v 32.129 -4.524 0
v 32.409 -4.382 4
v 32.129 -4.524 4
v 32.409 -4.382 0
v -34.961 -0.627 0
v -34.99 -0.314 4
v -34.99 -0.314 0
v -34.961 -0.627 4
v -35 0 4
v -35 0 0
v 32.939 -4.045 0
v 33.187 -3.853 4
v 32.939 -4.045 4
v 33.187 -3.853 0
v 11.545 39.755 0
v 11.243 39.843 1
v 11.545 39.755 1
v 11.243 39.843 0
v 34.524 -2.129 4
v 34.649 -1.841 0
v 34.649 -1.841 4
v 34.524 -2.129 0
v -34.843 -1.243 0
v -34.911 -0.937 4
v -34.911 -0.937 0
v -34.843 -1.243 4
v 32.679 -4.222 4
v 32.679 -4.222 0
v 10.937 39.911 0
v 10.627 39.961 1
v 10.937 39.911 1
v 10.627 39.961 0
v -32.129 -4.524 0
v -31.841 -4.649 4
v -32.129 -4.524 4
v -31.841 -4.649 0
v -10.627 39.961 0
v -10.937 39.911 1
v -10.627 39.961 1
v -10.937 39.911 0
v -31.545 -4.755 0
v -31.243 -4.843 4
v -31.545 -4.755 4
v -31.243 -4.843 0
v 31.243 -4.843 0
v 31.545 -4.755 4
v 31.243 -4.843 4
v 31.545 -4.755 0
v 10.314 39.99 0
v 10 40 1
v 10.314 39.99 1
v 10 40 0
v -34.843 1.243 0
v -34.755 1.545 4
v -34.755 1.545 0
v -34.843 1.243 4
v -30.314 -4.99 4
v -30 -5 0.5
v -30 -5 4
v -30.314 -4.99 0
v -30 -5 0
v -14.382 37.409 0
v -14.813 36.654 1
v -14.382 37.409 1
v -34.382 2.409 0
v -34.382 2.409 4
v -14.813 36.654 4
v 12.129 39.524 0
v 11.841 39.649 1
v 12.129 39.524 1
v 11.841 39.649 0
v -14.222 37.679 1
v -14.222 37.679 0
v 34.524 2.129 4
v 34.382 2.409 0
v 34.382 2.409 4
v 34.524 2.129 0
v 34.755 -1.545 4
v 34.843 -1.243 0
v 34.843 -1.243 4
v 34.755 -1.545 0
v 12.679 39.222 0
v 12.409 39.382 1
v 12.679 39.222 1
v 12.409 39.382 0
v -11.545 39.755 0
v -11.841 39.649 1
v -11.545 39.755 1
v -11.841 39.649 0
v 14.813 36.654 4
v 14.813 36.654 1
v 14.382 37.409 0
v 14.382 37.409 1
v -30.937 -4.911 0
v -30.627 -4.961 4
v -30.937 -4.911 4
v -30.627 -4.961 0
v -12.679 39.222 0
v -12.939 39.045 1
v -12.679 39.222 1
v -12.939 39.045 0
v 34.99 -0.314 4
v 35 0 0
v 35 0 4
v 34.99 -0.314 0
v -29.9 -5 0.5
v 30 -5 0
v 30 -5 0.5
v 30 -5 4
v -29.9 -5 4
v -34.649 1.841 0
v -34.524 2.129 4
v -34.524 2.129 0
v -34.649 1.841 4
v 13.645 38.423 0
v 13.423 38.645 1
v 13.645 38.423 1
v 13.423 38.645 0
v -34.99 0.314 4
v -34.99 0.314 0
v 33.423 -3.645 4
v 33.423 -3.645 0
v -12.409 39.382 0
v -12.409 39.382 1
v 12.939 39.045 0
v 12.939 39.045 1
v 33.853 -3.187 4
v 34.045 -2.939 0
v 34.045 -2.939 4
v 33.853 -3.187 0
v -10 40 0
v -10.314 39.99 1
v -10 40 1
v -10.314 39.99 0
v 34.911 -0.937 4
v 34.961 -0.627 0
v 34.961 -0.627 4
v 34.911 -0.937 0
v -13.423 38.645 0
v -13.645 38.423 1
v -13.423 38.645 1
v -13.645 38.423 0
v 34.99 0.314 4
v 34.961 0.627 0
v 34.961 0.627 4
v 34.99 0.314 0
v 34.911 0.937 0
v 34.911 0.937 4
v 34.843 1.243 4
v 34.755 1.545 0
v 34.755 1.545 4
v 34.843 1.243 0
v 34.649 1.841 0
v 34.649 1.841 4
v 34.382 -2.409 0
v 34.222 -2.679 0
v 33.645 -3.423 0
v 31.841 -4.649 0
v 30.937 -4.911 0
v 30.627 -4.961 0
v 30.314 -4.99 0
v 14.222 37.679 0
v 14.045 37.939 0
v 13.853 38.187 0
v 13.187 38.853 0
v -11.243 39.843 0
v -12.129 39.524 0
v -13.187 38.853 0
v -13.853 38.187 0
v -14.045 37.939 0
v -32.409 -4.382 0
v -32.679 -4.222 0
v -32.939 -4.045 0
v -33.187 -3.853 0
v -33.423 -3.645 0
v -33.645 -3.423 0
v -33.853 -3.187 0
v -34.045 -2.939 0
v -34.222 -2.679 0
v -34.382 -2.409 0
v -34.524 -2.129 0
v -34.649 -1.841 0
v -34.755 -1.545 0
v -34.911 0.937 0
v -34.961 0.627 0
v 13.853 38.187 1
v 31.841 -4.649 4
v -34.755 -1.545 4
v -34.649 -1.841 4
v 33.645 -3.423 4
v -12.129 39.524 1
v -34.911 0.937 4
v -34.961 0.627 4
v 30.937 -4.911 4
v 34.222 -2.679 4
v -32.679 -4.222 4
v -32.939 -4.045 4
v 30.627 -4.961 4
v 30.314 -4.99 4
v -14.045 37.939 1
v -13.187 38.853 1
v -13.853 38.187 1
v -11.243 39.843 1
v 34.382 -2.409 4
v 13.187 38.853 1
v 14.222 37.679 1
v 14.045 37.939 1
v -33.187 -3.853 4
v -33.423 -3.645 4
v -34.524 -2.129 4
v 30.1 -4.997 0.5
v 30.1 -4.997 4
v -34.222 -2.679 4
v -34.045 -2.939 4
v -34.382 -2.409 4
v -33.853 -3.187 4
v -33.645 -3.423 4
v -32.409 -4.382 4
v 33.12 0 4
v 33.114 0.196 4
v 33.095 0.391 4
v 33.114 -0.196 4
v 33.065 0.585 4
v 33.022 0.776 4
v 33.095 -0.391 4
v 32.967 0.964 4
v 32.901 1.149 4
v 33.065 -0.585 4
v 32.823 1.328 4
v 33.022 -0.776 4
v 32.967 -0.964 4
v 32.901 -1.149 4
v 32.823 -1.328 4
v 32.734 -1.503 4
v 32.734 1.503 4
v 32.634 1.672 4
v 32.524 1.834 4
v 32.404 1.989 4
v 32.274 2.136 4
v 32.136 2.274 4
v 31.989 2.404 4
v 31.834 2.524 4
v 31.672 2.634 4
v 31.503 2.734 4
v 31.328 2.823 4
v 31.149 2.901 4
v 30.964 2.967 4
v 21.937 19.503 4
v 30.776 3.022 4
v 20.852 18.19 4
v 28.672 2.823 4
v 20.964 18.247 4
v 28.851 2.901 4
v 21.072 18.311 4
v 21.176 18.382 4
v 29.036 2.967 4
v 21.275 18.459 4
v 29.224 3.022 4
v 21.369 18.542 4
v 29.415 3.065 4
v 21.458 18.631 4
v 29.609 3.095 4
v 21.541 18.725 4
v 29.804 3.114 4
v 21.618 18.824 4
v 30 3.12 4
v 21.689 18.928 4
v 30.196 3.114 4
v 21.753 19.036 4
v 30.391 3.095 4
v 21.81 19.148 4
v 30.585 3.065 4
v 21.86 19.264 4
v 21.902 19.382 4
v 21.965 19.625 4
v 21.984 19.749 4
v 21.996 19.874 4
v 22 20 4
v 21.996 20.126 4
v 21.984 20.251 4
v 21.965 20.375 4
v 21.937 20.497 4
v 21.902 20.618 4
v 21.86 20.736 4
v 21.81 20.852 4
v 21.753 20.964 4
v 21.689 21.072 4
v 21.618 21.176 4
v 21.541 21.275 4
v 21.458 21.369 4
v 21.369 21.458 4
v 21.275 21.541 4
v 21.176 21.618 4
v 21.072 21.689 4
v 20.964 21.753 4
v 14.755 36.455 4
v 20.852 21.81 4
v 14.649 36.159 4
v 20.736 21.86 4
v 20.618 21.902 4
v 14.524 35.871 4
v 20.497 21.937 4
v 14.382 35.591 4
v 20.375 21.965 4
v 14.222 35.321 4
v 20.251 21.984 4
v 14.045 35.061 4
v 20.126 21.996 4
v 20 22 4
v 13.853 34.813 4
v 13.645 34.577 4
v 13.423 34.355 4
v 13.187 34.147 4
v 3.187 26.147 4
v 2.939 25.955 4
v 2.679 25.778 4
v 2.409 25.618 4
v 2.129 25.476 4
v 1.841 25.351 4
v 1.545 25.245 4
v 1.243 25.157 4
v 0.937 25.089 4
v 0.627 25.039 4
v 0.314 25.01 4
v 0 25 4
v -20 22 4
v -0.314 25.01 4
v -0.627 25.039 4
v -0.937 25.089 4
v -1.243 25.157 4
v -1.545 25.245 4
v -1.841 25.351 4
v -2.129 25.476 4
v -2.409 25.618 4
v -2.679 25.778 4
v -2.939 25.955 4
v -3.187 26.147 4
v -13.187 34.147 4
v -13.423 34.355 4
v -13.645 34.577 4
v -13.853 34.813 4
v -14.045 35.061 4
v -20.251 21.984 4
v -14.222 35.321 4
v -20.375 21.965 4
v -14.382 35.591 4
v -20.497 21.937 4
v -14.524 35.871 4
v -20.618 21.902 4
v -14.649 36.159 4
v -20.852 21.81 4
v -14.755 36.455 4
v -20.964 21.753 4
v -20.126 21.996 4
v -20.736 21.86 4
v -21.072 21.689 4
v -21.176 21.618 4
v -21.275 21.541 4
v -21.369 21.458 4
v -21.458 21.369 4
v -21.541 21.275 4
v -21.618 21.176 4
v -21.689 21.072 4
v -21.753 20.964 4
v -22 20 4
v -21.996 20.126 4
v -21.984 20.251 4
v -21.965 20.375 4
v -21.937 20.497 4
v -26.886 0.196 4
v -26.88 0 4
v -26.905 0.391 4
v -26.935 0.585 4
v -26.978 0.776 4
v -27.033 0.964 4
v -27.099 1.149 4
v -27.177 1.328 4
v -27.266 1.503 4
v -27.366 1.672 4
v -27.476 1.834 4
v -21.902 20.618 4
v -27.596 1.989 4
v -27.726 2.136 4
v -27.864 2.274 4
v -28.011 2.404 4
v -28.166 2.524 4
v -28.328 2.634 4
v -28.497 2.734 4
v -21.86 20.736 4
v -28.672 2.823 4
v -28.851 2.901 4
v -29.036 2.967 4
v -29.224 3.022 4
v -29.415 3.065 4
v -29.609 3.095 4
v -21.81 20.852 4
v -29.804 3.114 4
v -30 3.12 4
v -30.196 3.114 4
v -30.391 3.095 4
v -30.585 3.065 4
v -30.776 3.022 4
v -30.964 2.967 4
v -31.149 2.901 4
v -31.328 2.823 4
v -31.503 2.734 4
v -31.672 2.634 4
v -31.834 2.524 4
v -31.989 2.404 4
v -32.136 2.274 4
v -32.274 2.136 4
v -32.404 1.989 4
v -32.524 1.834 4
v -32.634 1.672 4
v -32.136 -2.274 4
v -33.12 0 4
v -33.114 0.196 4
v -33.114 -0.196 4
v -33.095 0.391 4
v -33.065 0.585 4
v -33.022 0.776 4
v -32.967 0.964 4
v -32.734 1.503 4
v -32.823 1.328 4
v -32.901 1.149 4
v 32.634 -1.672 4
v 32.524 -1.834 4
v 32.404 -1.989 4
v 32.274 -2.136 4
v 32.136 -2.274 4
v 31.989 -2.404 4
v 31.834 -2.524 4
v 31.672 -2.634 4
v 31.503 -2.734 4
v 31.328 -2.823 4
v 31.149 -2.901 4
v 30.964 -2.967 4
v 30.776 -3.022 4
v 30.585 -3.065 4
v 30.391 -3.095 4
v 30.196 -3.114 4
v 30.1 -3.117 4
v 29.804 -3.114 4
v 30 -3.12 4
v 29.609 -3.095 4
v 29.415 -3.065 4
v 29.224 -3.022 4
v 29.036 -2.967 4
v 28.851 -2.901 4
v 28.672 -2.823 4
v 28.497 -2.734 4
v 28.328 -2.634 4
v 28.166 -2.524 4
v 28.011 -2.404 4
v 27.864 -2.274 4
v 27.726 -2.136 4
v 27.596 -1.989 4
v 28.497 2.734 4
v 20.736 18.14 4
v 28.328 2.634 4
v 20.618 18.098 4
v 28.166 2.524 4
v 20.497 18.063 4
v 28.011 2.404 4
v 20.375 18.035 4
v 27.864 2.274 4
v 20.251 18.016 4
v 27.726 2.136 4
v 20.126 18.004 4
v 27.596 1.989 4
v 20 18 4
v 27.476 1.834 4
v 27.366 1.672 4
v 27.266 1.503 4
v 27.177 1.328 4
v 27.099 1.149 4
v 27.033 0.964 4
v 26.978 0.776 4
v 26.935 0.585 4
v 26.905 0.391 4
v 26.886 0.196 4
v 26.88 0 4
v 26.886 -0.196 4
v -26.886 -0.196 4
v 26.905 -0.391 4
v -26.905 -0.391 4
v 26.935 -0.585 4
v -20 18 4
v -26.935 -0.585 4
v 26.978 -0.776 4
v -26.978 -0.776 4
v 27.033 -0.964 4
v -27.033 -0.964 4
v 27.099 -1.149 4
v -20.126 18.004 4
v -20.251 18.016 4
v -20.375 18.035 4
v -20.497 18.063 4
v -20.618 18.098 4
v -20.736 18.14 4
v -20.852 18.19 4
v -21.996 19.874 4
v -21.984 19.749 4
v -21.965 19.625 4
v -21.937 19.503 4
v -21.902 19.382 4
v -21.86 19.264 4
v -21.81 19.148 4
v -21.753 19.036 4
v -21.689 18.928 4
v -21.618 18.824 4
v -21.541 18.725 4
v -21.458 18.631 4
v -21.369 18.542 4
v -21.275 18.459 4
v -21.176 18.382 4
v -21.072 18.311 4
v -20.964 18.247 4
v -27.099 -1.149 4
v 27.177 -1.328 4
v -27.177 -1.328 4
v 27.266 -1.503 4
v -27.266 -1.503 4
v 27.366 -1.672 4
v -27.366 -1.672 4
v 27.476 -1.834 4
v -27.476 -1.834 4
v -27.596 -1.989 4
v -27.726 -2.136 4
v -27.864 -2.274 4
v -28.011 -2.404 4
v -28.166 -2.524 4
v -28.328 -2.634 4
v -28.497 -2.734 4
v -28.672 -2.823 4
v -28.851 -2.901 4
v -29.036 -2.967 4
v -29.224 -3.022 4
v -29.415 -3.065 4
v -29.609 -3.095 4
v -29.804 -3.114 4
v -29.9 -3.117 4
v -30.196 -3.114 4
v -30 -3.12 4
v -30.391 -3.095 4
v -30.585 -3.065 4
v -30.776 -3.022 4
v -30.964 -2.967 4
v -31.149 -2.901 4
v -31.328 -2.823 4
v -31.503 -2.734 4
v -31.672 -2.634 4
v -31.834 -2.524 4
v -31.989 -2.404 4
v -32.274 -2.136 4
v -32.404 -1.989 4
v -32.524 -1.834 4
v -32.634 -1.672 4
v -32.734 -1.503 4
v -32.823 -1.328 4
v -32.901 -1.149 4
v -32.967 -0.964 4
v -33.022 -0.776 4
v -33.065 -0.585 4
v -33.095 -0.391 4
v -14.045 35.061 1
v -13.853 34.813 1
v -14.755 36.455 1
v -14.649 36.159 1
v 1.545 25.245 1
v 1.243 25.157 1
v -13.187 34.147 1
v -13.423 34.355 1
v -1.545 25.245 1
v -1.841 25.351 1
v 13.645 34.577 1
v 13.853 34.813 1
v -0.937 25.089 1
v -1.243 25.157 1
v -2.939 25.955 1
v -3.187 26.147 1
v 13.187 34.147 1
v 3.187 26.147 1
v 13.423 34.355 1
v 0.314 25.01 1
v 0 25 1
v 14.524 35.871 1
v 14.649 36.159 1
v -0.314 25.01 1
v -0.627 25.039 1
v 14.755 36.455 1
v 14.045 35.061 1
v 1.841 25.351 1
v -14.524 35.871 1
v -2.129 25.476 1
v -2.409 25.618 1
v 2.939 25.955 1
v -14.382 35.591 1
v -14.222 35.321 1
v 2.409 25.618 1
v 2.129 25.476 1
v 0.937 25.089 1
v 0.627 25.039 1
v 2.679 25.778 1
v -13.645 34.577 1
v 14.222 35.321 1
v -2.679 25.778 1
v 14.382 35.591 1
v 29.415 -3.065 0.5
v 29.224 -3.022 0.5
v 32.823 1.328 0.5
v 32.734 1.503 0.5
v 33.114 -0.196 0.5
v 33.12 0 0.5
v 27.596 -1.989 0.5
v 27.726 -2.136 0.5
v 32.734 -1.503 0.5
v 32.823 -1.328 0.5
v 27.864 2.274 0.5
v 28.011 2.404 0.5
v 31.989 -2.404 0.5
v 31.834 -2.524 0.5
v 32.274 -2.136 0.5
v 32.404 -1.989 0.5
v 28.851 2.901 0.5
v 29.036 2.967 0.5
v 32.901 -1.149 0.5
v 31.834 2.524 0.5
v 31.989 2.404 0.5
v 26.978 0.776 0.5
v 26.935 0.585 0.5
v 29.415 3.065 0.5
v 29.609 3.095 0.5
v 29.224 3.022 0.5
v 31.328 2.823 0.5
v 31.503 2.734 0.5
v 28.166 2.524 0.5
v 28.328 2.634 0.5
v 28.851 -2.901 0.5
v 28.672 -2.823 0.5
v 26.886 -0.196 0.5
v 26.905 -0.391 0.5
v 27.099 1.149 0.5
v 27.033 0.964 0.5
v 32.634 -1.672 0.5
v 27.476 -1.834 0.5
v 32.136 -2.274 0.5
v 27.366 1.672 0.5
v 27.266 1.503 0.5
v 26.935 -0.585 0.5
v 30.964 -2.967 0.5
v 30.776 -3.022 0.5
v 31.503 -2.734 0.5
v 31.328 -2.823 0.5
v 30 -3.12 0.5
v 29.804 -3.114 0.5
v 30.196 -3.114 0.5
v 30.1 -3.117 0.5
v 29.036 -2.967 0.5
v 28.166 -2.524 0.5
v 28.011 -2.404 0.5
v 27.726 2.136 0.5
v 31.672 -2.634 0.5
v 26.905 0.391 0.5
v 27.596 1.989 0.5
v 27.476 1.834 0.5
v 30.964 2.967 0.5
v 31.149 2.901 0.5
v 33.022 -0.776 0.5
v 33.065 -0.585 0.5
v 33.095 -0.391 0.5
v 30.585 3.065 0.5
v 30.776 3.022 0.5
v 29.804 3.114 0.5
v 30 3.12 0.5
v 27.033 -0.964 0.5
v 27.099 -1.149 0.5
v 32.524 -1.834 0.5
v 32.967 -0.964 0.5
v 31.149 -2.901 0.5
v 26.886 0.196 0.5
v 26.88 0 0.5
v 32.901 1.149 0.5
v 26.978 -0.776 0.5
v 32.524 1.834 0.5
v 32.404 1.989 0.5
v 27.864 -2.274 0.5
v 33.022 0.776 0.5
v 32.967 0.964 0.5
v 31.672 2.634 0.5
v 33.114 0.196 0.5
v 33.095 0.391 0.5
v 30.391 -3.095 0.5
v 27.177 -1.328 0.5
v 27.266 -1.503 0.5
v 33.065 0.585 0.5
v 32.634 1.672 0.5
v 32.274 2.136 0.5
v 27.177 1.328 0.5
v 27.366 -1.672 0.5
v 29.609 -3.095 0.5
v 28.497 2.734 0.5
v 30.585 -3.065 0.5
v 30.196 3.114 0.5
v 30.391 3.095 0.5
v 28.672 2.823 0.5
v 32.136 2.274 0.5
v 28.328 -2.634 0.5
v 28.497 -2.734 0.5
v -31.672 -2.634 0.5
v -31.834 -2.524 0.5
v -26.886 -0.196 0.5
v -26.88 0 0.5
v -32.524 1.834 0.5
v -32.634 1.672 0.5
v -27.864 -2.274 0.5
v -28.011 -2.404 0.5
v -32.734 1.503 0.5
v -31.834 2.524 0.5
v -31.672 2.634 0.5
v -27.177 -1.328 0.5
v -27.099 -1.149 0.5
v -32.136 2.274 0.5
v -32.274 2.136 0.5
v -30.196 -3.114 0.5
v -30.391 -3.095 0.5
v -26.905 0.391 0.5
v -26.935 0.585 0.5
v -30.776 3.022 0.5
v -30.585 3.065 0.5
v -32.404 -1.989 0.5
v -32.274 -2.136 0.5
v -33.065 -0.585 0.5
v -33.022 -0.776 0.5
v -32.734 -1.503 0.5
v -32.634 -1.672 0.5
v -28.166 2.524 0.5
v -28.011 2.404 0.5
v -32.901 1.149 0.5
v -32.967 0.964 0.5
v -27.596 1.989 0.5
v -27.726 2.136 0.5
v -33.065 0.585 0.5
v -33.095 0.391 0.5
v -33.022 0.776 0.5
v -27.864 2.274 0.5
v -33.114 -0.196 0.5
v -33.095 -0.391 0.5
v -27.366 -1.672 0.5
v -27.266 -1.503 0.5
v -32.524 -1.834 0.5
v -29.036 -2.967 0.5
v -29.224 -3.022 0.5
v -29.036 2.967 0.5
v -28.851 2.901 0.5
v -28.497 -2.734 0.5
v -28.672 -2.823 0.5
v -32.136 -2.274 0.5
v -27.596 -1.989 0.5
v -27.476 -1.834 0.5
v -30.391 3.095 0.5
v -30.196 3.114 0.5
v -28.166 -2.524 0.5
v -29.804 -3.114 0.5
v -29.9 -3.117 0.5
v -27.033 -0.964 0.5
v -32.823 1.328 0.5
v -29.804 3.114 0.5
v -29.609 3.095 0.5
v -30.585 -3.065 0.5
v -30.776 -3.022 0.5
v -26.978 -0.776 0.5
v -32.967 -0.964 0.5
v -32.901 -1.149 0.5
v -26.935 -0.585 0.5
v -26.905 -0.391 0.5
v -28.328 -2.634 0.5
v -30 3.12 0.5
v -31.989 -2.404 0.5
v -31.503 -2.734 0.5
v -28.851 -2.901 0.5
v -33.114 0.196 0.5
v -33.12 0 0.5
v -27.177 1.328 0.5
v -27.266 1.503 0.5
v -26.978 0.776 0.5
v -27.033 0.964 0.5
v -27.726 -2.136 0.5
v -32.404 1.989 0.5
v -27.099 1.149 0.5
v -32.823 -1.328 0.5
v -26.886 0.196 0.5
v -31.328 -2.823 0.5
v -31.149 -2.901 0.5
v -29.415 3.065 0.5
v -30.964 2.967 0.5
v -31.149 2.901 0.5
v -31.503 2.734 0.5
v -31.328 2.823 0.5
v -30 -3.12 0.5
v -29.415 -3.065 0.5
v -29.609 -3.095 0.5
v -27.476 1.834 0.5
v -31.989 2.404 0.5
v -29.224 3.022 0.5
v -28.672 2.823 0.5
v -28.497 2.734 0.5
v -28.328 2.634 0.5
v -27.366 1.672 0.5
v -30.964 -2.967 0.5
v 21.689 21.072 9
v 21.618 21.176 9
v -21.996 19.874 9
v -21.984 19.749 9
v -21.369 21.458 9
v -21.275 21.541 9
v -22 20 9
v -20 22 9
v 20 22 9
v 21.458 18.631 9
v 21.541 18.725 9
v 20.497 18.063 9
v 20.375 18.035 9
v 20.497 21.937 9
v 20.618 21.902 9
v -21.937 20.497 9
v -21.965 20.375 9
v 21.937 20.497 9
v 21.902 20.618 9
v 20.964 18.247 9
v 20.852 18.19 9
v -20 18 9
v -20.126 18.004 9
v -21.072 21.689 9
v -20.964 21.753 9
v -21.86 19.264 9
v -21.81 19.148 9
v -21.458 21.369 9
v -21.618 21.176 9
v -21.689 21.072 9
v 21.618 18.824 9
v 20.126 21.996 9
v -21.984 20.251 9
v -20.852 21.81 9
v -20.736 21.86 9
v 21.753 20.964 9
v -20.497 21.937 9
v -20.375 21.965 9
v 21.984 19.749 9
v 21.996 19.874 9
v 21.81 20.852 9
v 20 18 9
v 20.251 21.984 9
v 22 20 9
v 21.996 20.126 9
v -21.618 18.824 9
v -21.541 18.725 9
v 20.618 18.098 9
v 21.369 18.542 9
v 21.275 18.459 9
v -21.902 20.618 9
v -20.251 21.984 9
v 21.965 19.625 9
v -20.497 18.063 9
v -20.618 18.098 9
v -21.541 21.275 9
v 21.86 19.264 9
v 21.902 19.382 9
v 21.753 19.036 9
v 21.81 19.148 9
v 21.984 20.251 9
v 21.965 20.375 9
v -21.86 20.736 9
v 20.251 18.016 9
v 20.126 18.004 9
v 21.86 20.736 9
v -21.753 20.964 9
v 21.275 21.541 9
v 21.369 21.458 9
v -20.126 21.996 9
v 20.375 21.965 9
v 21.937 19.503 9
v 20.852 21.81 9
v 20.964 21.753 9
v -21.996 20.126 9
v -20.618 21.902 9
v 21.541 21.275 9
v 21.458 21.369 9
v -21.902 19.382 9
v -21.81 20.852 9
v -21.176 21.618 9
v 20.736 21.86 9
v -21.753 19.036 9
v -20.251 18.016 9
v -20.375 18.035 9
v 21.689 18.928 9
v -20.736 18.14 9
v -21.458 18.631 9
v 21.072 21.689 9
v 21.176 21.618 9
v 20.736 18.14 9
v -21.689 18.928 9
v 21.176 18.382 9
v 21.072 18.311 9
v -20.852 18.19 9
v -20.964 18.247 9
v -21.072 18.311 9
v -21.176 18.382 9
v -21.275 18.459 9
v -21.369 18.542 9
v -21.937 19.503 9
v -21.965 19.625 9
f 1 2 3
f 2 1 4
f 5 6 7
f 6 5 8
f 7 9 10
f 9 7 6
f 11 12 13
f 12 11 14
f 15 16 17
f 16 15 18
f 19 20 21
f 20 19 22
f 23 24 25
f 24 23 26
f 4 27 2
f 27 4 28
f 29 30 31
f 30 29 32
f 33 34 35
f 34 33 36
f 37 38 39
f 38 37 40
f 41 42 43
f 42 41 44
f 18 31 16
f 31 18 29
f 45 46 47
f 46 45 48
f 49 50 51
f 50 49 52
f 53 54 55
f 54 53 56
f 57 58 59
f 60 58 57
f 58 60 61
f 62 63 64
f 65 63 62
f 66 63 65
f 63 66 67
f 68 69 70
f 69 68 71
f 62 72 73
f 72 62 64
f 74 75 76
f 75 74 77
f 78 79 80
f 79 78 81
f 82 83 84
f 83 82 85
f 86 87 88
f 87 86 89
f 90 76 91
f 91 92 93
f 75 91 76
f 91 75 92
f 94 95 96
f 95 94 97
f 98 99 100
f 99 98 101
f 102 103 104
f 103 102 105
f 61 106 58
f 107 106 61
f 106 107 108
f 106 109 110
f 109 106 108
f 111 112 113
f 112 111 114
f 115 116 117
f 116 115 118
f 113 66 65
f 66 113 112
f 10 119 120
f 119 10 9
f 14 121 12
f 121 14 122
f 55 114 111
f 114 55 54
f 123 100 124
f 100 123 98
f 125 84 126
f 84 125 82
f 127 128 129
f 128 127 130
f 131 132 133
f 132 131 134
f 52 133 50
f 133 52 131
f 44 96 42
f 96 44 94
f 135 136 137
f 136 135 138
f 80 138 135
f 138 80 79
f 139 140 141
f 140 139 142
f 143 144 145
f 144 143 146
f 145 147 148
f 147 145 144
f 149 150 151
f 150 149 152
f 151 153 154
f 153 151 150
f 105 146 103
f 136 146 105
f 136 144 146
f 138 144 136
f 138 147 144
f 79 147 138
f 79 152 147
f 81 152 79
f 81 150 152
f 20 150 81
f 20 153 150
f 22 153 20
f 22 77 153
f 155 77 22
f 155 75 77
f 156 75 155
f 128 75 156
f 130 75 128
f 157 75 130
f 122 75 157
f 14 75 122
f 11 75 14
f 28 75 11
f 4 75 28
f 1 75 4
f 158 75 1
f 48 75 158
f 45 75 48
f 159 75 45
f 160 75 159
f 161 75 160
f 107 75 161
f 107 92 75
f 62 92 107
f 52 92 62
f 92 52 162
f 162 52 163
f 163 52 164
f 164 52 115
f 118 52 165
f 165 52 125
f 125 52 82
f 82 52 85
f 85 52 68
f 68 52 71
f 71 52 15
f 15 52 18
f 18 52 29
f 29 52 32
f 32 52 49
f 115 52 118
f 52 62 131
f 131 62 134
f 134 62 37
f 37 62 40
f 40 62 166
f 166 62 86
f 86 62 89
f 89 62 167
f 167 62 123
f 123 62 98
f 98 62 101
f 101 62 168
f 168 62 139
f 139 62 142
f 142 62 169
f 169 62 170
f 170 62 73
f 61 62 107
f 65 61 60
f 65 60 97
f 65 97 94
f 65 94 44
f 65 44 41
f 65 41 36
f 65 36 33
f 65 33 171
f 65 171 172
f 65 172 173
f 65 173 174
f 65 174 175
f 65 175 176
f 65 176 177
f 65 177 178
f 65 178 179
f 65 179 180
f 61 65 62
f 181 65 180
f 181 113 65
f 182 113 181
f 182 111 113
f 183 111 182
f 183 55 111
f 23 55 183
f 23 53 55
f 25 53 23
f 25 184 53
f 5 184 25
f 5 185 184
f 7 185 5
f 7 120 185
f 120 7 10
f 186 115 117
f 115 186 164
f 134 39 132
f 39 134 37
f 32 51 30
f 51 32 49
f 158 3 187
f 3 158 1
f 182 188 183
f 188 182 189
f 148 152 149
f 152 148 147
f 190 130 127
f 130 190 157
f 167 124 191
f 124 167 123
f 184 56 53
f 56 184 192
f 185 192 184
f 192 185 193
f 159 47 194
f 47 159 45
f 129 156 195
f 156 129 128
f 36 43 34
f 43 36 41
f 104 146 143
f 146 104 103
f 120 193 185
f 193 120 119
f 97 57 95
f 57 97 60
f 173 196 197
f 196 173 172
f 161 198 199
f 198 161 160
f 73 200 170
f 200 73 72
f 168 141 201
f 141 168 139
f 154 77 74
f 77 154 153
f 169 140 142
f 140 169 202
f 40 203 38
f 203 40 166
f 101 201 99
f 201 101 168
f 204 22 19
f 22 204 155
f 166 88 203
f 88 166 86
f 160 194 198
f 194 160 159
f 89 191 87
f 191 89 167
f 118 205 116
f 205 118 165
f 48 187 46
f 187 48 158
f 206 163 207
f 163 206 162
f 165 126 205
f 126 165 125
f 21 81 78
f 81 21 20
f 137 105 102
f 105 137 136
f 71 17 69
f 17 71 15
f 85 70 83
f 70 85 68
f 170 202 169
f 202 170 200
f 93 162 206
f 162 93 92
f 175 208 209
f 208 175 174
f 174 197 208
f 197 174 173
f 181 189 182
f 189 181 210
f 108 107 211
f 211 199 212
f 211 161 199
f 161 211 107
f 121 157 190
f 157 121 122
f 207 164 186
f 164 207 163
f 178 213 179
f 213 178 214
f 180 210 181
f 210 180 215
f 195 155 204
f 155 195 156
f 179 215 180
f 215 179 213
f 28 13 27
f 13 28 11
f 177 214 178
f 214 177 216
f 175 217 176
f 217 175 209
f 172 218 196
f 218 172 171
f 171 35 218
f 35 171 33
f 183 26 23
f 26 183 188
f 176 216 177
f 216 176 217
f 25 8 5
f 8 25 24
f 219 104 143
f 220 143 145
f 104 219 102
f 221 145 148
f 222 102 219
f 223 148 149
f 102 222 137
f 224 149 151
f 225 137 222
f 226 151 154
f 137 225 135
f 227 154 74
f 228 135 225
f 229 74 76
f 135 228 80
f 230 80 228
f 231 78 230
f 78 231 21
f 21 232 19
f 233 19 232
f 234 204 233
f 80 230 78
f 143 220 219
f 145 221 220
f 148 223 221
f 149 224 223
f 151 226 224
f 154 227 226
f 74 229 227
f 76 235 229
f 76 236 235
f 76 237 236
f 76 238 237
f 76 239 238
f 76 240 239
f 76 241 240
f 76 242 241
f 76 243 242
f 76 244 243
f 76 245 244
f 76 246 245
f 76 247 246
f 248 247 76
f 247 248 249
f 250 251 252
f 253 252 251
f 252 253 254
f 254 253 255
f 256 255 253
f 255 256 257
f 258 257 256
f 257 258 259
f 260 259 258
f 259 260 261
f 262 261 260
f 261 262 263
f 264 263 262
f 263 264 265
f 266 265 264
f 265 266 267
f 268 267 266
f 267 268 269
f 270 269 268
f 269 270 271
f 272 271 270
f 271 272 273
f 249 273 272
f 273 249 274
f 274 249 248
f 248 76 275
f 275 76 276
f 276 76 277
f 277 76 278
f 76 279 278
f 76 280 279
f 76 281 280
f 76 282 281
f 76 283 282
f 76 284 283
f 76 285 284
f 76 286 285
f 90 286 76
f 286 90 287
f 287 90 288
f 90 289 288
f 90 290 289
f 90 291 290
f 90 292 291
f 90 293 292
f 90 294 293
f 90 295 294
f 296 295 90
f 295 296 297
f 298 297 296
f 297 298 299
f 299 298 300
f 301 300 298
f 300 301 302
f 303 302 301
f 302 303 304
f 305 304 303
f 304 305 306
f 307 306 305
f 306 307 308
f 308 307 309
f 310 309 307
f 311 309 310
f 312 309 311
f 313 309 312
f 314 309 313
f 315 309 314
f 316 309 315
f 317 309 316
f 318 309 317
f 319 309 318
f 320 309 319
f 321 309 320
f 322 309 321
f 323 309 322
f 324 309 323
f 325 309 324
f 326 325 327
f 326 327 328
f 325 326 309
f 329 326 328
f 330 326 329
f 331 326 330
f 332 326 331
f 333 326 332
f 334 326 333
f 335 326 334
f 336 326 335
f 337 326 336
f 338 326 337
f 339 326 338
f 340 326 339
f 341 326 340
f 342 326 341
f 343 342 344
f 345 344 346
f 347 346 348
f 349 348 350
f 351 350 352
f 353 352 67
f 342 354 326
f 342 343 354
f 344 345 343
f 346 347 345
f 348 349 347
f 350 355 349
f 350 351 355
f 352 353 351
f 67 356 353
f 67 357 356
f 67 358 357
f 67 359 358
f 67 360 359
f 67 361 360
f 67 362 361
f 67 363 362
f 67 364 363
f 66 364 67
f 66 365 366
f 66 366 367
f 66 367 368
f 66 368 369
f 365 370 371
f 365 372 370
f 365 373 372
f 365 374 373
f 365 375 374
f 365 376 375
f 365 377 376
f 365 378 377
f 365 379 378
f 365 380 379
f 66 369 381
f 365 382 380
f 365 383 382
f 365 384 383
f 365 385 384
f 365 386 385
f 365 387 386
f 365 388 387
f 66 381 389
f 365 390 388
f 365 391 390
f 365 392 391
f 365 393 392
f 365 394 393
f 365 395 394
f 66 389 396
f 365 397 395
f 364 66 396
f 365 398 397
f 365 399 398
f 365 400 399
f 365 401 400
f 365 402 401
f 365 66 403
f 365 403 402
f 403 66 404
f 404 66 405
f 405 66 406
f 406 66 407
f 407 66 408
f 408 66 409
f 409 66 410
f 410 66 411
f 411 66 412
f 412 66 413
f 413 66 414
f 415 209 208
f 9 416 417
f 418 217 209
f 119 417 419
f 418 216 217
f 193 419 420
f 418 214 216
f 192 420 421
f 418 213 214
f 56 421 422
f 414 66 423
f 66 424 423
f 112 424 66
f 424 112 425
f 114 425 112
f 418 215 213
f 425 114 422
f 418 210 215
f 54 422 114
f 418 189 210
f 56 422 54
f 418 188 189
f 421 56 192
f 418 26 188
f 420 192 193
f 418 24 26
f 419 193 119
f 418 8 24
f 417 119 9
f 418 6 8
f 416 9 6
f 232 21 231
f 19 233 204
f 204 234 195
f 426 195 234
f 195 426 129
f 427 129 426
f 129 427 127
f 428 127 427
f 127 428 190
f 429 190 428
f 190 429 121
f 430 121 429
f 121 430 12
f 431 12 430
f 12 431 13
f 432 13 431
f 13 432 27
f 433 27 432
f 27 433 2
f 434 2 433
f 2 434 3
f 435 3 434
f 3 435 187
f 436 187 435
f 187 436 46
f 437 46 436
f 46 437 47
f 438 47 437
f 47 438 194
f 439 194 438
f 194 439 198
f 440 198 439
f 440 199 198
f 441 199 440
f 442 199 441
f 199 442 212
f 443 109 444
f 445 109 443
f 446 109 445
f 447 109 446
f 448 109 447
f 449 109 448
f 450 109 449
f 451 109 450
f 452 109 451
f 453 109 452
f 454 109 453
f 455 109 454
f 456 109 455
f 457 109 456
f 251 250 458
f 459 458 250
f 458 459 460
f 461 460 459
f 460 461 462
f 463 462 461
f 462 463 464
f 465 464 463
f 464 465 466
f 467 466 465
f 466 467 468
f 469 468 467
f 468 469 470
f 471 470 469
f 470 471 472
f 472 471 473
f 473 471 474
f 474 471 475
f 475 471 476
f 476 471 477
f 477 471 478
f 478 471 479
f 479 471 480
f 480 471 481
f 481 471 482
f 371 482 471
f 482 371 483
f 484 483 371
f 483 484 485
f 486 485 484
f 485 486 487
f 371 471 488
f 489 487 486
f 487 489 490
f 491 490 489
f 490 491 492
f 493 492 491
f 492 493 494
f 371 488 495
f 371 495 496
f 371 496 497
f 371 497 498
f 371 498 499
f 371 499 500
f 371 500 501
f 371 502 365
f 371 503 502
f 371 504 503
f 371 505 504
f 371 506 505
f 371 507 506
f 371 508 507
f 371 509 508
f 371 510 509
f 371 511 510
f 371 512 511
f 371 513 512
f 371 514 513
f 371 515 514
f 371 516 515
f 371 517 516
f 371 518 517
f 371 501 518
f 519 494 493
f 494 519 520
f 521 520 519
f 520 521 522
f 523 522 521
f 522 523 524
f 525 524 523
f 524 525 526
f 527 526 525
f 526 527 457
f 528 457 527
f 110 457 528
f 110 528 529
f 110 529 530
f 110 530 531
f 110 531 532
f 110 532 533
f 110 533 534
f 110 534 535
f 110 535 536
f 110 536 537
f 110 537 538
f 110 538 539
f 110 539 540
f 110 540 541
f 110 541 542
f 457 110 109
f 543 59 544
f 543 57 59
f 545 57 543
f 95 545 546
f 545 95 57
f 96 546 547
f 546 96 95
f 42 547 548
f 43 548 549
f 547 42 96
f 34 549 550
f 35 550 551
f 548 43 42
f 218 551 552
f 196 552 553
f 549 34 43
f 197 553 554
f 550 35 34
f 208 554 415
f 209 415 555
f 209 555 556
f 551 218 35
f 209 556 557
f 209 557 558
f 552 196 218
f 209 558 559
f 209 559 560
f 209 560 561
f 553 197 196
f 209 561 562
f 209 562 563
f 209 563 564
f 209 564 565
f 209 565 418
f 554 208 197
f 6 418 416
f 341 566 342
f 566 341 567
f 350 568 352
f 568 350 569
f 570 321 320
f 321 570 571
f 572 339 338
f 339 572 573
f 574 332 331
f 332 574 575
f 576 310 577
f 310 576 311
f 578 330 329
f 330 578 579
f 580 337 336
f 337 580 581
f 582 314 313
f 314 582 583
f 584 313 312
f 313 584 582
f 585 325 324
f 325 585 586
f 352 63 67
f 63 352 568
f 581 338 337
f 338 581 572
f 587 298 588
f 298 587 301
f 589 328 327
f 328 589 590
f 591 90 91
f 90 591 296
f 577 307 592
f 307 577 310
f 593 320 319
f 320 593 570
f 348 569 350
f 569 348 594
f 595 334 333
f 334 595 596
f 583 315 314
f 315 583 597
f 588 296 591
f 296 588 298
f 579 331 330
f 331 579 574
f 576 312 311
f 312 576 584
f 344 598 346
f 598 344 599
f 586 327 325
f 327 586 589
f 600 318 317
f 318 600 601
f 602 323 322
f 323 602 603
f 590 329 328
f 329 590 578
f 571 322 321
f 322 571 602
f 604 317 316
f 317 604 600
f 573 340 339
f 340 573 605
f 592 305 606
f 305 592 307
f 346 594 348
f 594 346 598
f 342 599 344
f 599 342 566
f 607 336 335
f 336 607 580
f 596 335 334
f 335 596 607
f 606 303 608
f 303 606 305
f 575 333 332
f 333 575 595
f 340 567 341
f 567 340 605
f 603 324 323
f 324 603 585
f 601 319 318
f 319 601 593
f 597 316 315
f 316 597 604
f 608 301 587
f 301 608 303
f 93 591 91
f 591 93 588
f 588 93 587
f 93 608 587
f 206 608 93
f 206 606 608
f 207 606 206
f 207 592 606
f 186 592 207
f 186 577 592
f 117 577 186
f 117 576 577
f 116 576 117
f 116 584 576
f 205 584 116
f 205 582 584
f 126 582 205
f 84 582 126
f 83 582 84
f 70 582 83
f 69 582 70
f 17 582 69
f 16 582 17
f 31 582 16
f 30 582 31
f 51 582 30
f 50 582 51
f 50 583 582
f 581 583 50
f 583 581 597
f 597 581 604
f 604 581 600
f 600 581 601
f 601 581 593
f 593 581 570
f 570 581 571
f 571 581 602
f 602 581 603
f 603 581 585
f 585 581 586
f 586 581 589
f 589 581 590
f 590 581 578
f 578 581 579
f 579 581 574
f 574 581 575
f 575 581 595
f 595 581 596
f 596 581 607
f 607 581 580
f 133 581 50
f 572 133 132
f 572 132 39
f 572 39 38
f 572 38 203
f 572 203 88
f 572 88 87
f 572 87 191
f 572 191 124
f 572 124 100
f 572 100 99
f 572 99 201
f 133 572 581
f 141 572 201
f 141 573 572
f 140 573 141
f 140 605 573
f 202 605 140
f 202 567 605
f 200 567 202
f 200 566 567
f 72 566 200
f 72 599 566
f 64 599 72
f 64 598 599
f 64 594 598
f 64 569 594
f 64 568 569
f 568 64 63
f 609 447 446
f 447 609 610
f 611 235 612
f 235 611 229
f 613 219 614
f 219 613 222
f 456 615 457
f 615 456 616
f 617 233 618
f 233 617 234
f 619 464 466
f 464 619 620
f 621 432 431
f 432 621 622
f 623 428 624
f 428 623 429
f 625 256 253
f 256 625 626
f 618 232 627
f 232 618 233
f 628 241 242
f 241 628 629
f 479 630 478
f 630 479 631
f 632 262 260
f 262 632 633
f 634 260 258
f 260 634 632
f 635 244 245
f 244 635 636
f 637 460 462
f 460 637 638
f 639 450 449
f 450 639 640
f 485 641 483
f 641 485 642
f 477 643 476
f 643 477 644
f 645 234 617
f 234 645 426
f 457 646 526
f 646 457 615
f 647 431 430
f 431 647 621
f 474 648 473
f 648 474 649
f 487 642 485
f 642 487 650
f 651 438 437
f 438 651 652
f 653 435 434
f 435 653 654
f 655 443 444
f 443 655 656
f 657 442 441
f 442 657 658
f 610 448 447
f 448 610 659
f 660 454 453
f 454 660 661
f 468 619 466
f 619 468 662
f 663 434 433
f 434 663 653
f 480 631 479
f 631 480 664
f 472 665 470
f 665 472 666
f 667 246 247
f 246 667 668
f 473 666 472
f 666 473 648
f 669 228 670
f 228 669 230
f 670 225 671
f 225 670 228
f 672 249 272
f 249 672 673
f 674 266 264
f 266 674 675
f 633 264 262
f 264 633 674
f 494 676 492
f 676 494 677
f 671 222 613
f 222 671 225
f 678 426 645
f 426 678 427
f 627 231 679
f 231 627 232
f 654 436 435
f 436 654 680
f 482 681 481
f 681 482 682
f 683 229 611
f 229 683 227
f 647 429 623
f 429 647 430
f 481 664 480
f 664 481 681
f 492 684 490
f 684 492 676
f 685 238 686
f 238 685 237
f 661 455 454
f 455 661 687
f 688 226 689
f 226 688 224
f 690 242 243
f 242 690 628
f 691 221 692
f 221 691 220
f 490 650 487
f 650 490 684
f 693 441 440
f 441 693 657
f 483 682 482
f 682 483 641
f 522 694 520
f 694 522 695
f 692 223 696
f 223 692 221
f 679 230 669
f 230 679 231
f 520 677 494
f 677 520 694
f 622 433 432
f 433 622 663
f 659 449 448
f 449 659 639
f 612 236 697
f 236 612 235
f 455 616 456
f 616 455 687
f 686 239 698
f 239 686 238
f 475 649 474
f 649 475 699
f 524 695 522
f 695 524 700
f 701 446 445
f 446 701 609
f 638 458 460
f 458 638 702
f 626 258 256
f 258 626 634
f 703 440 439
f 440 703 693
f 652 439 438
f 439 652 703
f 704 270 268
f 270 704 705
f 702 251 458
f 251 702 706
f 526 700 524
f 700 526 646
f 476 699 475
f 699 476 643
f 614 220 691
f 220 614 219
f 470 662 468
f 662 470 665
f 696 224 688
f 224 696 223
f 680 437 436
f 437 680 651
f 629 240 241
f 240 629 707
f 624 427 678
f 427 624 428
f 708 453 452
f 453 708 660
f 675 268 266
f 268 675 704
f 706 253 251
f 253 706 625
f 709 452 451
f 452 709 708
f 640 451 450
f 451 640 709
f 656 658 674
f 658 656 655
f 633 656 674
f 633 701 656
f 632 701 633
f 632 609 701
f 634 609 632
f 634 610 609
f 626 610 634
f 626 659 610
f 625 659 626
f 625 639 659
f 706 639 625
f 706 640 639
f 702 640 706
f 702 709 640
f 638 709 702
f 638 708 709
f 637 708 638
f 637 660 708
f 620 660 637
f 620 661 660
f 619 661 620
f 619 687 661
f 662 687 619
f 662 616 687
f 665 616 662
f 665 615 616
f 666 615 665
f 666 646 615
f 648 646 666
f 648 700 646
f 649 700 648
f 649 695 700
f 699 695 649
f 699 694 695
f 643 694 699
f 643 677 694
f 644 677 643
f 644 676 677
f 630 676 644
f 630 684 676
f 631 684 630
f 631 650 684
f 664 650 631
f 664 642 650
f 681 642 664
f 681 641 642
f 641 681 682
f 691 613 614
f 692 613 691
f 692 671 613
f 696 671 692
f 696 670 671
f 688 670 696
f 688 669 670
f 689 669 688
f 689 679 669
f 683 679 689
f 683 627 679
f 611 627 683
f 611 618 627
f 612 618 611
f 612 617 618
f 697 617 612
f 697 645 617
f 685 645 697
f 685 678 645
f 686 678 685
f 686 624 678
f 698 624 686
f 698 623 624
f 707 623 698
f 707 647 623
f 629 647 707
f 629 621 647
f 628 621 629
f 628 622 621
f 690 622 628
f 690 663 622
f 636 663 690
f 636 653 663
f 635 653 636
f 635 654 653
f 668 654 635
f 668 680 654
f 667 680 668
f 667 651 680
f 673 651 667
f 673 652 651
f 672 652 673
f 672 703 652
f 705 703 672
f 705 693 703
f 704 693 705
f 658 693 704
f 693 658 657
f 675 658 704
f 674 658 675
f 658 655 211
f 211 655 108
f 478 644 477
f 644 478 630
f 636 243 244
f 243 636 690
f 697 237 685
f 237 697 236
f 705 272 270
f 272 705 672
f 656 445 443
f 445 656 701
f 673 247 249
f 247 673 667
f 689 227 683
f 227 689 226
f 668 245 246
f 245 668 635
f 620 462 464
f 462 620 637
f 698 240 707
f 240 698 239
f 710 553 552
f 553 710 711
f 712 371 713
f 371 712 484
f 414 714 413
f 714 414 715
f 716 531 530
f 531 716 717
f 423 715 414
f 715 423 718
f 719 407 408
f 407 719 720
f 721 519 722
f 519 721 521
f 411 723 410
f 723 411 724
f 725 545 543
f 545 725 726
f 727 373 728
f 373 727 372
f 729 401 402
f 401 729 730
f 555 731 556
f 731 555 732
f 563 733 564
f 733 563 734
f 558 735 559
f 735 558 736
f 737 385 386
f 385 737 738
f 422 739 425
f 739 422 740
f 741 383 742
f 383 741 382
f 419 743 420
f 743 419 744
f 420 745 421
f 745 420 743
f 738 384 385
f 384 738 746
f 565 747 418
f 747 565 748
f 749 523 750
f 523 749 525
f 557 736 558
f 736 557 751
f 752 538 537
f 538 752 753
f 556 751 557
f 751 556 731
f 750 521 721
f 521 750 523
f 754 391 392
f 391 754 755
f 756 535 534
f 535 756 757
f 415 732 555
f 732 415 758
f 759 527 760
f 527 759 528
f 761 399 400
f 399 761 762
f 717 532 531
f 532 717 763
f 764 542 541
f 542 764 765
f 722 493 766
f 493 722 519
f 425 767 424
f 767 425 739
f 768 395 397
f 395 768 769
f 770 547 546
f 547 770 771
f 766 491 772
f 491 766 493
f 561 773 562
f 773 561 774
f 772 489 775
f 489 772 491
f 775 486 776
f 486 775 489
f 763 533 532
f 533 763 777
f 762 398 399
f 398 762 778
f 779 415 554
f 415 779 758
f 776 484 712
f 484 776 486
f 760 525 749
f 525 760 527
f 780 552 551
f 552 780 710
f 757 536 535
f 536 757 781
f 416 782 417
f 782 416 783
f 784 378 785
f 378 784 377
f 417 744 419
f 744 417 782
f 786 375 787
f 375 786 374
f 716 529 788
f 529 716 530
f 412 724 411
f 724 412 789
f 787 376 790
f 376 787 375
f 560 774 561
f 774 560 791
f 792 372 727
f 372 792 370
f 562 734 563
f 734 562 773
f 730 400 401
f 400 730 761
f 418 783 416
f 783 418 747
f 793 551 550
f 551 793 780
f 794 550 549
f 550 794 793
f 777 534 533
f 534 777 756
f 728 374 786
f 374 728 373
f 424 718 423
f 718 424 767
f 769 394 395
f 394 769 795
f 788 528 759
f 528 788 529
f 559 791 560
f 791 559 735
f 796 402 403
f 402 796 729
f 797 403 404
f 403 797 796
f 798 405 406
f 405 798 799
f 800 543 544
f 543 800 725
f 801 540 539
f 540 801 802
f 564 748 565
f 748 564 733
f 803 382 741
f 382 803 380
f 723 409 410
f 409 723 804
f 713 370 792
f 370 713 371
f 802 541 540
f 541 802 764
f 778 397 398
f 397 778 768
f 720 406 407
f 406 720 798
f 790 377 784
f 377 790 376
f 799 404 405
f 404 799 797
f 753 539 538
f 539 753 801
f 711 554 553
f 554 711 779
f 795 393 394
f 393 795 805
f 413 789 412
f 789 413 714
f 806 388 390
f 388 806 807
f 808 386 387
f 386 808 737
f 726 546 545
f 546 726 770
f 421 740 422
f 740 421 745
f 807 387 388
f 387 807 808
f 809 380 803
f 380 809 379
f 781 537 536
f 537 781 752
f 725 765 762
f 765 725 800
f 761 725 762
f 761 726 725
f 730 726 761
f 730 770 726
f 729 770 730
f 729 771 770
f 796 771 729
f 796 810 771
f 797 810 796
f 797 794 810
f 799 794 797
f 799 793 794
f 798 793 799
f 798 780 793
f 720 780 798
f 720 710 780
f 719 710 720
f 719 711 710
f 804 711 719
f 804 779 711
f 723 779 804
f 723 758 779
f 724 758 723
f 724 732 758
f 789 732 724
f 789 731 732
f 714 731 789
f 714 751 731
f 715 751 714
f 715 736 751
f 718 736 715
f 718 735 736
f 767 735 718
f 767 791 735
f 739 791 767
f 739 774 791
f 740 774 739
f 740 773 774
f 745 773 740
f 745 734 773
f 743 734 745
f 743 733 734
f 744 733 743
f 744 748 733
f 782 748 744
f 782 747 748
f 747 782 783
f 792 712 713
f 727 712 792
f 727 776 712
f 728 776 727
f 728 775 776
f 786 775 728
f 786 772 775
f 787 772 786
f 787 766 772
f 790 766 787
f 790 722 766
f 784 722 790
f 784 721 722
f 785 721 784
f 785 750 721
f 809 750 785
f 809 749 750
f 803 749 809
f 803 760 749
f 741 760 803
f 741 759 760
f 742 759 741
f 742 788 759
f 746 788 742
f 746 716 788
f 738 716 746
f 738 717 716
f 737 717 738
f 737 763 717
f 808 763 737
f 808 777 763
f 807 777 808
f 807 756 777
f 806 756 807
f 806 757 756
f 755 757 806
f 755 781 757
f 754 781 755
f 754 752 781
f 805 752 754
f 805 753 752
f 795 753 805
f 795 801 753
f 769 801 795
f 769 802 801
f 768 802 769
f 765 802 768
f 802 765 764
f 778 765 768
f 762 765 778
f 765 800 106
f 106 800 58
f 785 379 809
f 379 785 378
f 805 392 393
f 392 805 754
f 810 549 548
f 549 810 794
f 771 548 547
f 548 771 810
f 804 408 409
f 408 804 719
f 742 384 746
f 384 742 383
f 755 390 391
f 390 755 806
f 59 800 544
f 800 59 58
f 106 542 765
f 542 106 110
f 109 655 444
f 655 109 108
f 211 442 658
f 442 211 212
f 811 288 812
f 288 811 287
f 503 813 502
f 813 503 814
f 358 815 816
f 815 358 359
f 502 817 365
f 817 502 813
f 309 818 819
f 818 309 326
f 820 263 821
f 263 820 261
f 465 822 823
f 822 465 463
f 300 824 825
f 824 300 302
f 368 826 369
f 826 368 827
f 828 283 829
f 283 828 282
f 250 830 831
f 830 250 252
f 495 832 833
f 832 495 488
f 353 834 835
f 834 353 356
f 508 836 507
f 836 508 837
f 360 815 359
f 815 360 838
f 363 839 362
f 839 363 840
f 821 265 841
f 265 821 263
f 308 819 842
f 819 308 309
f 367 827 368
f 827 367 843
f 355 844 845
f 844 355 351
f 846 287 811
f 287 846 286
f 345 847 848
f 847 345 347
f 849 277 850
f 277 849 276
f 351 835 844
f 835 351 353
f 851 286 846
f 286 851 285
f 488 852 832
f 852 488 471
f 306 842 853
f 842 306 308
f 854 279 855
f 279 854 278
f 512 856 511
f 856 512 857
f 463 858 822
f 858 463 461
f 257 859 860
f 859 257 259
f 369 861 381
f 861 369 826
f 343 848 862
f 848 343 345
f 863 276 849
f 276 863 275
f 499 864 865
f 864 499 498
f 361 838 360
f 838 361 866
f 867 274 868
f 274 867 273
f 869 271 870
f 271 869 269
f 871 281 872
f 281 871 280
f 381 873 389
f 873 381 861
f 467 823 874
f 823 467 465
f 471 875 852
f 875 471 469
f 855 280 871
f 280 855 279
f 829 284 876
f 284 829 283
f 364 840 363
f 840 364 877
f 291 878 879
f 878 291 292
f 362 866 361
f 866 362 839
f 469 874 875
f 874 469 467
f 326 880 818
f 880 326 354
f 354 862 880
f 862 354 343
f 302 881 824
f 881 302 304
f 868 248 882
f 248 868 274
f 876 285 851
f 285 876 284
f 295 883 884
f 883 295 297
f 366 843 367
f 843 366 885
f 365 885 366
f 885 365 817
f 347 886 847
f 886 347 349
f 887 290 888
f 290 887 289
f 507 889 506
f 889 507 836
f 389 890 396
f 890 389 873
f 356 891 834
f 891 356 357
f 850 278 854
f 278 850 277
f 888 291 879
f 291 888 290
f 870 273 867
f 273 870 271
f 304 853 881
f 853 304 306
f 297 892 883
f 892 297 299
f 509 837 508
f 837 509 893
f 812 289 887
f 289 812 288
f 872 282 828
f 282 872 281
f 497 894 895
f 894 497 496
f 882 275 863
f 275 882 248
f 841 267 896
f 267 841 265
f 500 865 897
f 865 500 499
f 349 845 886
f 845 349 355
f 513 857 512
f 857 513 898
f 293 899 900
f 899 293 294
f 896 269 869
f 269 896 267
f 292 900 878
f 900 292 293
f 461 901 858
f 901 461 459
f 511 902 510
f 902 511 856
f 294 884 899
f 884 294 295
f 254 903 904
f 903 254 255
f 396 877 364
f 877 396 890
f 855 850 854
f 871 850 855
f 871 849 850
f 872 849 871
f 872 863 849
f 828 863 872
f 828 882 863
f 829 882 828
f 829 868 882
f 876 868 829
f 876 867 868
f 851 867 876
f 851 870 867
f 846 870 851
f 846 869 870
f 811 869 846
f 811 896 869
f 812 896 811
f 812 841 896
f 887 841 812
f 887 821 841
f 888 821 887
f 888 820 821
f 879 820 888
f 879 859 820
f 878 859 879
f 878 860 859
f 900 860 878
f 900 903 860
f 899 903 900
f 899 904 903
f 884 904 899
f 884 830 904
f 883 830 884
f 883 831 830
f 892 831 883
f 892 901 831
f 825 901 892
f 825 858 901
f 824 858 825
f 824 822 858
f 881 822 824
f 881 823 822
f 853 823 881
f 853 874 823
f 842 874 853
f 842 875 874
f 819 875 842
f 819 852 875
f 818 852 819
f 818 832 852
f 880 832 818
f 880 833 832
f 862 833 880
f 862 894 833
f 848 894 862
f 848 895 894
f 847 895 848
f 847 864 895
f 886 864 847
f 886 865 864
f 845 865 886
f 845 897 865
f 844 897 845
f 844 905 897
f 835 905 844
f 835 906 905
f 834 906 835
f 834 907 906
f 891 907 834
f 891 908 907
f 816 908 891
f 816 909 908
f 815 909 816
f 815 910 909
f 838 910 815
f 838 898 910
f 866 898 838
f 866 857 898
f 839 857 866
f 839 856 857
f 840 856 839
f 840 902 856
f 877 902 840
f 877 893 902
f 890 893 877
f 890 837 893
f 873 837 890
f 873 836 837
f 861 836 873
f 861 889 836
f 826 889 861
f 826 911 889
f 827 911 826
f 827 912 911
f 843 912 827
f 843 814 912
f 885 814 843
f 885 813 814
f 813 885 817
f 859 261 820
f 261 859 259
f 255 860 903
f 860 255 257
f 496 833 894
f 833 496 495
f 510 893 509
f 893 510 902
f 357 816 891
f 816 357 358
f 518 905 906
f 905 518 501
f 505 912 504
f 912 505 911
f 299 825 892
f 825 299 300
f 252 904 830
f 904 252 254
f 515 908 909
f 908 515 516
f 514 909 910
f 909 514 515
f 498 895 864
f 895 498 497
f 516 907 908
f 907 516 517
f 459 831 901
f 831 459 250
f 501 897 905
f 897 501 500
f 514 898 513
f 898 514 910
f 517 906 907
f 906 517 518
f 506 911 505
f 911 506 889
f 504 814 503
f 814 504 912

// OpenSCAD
union(){
    difference(){
        linear_extrude(4) hull(){
            translate([10,35,0]) circle(5,$fn=100);
            translate([-10,35,0]) circle(5,$fn=100);
            translate([30,0,0]) circle(5,$fn=100);
            translate([-30,0,0]) circle(5,$fn=100);
        }
        translate([0,0,1]) linear_extrude(4) hull(){
            translate([10,38,0]) circle(5,$fn=100);
            translate([-10,38,0]) circle(5,$fn=100);
            translate([0,30,0]) circle(5,$fn=100);
        }
        // 磁石穴
        translate([30,0,0.5]) linear_extrude(4) circle(3.12,$fn=100);
        translate([-30,0,0.5]) linear_extrude(4) circle(3.12,$fn=100);
        // 線
        translate([-30,-5,0.5]) linear_extrude(4) square([0.1,2]);
        translate([30,-5,0.5]) linear_extrude(4) square([0.1,2]);
    }
    color("red") translate([0,20,4]) linear_extrude(5) hull(){
        translate([20,0,0]) circle(2,$fn=100);
        translate([-20,0,0]) circle(2,$fn=100);
    }
}
